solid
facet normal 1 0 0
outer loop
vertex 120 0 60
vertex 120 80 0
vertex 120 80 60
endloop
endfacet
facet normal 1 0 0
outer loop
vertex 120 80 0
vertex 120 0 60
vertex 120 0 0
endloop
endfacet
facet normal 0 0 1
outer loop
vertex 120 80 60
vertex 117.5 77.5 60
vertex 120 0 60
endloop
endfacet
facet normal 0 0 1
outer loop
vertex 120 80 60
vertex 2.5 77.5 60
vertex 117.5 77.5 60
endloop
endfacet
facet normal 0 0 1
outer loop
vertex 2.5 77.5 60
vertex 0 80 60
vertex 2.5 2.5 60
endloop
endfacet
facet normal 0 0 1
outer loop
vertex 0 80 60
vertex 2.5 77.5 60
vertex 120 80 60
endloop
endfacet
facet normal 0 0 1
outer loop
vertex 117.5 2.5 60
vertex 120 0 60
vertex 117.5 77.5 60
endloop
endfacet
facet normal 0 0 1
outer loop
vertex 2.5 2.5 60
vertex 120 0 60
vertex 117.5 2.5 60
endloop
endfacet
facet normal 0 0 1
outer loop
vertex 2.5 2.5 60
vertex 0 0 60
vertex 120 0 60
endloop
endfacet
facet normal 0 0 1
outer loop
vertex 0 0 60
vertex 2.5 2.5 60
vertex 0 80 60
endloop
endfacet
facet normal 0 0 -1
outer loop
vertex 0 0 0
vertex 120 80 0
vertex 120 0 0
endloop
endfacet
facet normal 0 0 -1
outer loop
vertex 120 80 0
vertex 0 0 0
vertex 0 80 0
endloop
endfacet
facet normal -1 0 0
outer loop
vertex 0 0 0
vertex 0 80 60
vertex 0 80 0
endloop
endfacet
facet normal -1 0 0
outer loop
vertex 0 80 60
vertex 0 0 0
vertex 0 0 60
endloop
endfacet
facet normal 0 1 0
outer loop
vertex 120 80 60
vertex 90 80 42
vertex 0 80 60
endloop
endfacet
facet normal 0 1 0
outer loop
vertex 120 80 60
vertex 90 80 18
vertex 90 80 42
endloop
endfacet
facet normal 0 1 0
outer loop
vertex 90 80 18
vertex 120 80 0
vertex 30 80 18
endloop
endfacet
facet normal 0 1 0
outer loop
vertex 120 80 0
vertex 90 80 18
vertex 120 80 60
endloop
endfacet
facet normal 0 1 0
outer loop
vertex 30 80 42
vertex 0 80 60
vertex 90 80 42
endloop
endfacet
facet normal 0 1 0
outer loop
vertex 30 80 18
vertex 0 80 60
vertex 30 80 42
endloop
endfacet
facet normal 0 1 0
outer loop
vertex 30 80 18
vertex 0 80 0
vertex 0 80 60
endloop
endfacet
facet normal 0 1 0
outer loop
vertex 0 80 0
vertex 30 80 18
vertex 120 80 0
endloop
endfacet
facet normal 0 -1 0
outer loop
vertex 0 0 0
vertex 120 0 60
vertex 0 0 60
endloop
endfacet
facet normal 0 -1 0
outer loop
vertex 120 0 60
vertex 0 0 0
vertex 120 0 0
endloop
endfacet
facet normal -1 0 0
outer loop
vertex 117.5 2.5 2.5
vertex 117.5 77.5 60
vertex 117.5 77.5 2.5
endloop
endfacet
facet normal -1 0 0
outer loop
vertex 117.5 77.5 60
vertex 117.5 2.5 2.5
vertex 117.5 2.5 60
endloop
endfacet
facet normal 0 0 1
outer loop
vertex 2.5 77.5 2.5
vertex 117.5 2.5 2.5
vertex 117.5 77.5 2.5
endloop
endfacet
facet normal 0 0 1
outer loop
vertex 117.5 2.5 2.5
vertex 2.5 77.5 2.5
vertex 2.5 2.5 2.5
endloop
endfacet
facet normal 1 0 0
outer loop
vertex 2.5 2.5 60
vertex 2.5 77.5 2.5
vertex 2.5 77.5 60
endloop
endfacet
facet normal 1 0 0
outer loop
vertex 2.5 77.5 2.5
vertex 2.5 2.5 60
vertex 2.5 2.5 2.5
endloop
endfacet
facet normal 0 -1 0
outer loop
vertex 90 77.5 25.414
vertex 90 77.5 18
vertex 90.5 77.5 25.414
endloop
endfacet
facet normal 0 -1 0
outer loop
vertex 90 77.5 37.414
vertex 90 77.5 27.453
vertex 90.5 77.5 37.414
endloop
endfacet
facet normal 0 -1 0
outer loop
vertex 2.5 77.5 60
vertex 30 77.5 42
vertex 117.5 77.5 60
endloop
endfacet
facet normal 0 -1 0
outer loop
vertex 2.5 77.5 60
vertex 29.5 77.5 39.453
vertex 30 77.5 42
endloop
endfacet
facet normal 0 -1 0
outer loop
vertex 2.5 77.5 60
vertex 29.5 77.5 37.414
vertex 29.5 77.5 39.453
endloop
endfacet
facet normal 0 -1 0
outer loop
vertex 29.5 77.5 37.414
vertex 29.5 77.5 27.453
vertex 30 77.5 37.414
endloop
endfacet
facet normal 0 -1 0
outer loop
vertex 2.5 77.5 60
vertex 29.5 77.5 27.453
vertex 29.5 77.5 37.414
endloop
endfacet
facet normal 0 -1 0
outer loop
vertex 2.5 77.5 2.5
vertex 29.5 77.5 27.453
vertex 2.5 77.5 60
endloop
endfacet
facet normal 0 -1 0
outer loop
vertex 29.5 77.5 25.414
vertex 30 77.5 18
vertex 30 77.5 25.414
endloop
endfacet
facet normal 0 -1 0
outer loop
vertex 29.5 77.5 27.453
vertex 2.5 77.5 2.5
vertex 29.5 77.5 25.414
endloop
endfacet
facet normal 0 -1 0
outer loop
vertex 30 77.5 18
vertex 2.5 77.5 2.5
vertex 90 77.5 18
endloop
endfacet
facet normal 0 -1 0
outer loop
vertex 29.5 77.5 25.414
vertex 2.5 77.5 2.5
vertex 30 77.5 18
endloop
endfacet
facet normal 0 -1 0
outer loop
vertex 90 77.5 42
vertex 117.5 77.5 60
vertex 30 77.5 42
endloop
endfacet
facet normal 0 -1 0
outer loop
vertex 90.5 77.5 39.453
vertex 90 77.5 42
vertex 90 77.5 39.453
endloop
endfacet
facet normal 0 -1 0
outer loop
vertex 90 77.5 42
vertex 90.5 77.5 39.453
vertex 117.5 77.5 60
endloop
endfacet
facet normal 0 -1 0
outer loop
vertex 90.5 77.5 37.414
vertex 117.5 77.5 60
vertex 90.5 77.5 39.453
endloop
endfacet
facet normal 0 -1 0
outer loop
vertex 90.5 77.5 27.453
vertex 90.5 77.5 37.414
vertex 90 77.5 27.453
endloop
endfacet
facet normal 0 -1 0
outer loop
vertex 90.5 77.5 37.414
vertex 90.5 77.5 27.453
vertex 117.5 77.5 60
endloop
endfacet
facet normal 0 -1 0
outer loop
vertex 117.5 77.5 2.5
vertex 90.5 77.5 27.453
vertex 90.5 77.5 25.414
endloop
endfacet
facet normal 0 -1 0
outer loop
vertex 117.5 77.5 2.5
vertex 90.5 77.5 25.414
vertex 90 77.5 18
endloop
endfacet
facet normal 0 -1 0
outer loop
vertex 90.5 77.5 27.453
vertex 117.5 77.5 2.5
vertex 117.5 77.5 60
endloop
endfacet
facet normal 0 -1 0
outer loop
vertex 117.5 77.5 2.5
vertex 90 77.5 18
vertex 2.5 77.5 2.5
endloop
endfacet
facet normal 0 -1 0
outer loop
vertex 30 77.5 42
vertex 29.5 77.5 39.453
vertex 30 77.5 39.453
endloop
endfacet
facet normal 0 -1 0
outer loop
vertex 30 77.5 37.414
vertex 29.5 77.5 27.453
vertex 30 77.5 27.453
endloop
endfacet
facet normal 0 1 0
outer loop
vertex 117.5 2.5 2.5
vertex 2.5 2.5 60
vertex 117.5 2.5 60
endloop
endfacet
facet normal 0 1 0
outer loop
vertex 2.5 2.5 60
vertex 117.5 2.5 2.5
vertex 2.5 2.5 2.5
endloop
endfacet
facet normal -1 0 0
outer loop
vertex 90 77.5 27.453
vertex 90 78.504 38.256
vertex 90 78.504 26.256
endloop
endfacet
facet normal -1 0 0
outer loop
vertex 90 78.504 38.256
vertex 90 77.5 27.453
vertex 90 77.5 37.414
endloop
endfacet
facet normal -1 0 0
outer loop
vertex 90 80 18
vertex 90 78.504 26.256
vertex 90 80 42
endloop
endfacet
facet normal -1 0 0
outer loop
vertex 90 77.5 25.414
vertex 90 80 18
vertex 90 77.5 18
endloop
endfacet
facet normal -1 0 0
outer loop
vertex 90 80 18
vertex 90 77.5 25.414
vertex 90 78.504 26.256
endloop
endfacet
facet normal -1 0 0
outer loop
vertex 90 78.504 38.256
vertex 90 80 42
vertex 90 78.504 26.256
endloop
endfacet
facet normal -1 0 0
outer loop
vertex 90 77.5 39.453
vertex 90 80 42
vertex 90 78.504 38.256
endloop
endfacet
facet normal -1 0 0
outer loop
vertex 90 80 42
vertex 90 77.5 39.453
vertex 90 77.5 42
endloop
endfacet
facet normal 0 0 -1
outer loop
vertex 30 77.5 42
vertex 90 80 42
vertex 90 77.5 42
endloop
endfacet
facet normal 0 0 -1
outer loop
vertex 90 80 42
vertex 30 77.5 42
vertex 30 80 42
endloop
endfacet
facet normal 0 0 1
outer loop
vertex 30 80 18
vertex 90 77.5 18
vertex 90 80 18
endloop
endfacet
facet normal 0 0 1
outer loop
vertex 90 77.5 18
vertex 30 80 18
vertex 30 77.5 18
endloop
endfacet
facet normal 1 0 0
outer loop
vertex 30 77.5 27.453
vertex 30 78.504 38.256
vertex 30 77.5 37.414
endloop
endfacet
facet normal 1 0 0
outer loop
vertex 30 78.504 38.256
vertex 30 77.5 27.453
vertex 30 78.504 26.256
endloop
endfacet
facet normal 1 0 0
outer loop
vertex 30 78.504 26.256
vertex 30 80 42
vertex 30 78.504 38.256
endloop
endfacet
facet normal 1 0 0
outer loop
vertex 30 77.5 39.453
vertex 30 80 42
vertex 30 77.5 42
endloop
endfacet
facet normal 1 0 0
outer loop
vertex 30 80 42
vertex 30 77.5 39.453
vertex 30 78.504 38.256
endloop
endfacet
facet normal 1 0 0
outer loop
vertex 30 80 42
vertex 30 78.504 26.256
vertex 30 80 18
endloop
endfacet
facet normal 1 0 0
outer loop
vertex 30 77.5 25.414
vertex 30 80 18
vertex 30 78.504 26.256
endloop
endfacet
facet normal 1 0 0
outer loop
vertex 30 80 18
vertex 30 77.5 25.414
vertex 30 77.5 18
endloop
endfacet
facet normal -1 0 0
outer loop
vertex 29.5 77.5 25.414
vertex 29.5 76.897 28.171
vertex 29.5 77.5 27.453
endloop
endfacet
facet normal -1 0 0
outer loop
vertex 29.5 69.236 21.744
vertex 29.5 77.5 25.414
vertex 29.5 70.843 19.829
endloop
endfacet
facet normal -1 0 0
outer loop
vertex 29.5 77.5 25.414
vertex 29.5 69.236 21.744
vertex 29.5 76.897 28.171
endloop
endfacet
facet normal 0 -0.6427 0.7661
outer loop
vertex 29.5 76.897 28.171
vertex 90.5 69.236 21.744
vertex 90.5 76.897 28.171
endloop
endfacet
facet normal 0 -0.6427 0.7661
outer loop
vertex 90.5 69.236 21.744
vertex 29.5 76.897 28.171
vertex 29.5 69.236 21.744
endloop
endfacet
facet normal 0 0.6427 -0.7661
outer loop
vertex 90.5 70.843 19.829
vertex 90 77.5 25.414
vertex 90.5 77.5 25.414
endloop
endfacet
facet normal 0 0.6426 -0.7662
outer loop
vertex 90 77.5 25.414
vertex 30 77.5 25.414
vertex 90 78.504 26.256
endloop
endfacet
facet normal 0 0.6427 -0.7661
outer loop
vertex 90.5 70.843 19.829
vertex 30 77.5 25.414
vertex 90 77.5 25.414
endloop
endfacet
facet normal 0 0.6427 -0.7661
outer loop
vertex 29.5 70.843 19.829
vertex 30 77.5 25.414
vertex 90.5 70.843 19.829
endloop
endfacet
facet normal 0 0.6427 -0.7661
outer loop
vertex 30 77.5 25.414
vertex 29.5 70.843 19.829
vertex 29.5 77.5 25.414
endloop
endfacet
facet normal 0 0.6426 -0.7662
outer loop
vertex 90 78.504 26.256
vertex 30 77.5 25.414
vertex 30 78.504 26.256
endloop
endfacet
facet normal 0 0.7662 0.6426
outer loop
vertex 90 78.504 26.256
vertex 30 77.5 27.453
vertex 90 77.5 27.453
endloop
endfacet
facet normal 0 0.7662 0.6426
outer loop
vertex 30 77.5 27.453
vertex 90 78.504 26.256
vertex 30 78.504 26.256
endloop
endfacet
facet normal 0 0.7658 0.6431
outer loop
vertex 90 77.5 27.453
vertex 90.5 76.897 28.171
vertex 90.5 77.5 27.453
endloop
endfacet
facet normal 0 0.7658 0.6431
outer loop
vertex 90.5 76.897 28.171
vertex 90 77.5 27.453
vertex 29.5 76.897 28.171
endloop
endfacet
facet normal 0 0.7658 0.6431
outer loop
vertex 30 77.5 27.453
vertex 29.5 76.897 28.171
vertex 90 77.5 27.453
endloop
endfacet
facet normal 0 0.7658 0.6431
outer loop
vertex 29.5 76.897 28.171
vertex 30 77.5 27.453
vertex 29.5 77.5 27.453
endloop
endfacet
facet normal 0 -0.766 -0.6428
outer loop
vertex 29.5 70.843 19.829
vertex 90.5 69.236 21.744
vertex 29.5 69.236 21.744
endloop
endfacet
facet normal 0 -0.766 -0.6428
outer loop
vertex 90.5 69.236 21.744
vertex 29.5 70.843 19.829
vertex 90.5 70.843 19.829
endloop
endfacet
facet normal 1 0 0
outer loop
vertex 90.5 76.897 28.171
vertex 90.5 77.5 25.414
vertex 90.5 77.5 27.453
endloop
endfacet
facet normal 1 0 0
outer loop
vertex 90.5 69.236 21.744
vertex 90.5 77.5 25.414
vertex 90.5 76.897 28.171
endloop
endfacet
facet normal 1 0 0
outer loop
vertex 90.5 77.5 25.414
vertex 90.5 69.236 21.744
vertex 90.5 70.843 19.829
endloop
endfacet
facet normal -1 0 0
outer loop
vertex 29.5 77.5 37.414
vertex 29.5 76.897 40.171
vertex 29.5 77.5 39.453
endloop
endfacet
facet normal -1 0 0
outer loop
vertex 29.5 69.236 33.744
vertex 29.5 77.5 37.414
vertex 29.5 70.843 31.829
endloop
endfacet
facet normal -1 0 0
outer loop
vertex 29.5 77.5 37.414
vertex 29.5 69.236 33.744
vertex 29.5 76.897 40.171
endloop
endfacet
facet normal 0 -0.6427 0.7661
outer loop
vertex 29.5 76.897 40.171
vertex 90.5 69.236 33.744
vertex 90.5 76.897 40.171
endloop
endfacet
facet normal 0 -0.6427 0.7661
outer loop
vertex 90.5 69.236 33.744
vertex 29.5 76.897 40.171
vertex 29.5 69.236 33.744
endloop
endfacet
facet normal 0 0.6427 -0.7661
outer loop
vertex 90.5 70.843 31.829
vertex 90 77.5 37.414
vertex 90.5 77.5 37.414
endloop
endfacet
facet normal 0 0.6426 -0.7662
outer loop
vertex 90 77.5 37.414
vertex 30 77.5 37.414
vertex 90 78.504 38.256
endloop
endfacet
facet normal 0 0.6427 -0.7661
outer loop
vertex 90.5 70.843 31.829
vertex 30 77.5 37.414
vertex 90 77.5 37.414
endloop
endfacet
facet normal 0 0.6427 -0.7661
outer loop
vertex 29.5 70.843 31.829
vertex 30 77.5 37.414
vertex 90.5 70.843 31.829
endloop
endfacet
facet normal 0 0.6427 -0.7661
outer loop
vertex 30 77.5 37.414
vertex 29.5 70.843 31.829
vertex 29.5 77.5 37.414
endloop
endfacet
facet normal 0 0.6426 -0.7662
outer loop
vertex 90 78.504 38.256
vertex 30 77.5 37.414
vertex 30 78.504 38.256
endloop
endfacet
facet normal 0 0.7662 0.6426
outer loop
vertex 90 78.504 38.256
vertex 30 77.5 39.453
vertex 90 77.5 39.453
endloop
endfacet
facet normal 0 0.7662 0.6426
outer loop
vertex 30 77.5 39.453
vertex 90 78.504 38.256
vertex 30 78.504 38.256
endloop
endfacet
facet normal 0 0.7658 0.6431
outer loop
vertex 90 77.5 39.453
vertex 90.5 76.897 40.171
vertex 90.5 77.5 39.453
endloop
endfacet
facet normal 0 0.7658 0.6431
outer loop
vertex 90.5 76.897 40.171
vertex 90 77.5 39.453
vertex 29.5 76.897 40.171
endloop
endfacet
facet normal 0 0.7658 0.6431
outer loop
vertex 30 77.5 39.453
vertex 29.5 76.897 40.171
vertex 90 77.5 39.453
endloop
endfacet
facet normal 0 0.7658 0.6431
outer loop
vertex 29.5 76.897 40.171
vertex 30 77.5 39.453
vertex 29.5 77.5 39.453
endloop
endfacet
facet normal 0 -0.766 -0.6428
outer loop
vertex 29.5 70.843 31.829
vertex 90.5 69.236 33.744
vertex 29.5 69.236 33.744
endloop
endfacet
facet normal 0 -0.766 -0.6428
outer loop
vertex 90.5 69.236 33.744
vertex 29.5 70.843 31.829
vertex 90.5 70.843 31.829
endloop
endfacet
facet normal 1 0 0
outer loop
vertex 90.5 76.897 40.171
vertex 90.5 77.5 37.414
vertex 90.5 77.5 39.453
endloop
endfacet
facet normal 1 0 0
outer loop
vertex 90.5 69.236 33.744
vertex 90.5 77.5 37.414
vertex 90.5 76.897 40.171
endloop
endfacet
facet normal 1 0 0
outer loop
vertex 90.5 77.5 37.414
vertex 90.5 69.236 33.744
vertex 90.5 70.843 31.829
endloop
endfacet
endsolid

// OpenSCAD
$fn = 32;

// ----------------------------------------------------------------------
// Vent box: louvers enclosure
// ----------------------------------------------------------------------

// --- parameters (mm) ---
box_l = 120;              // box length, X
box_w = 80;               // box width, Y
box_h = 60;               // box height, Z
wall_t = 2.5;             // shell wall thickness
win_l = 60;               // vent window width, X
win_h = 24;               // vent window height, Z
slat_t = 2.5;             // louver slat thickness
slat_d = 10;              // louver slat depth
slat_a = 40;              // louver slat angle, degrees
slat_pitch = 12;          // louver pitch
slat_yc = 73.87;          // slat centreline Y

win_z0 = (box_h - win_h) / 2;  // window lower edge Z
n_slats = 2;  // louver count
slat_z0 = win_z0 + (win_h - (n_slats - 1) * slat_pitch) / 2;

difference() {
  union() {
    difference() {
      cube([box_l, box_w, box_h]);
  translate([wall_t, wall_t, wall_t])
    cube([box_l - 2 * wall_t, box_w - 2 * wall_t, box_h]);
  translate([(box_l - win_l) / 2, box_w - wall_t - 1, win_z0])
    cube([win_l, wall_t + 2, win_h]);
    }
    for (i = [0 : n_slats - 1])
      translate([box_l / 2, slat_yc, slat_z0 + i * slat_pitch])
        rotate([slat_a, 0, 0])
          cube([win_l + 1, slat_d, slat_t], center = true);
  }
}
